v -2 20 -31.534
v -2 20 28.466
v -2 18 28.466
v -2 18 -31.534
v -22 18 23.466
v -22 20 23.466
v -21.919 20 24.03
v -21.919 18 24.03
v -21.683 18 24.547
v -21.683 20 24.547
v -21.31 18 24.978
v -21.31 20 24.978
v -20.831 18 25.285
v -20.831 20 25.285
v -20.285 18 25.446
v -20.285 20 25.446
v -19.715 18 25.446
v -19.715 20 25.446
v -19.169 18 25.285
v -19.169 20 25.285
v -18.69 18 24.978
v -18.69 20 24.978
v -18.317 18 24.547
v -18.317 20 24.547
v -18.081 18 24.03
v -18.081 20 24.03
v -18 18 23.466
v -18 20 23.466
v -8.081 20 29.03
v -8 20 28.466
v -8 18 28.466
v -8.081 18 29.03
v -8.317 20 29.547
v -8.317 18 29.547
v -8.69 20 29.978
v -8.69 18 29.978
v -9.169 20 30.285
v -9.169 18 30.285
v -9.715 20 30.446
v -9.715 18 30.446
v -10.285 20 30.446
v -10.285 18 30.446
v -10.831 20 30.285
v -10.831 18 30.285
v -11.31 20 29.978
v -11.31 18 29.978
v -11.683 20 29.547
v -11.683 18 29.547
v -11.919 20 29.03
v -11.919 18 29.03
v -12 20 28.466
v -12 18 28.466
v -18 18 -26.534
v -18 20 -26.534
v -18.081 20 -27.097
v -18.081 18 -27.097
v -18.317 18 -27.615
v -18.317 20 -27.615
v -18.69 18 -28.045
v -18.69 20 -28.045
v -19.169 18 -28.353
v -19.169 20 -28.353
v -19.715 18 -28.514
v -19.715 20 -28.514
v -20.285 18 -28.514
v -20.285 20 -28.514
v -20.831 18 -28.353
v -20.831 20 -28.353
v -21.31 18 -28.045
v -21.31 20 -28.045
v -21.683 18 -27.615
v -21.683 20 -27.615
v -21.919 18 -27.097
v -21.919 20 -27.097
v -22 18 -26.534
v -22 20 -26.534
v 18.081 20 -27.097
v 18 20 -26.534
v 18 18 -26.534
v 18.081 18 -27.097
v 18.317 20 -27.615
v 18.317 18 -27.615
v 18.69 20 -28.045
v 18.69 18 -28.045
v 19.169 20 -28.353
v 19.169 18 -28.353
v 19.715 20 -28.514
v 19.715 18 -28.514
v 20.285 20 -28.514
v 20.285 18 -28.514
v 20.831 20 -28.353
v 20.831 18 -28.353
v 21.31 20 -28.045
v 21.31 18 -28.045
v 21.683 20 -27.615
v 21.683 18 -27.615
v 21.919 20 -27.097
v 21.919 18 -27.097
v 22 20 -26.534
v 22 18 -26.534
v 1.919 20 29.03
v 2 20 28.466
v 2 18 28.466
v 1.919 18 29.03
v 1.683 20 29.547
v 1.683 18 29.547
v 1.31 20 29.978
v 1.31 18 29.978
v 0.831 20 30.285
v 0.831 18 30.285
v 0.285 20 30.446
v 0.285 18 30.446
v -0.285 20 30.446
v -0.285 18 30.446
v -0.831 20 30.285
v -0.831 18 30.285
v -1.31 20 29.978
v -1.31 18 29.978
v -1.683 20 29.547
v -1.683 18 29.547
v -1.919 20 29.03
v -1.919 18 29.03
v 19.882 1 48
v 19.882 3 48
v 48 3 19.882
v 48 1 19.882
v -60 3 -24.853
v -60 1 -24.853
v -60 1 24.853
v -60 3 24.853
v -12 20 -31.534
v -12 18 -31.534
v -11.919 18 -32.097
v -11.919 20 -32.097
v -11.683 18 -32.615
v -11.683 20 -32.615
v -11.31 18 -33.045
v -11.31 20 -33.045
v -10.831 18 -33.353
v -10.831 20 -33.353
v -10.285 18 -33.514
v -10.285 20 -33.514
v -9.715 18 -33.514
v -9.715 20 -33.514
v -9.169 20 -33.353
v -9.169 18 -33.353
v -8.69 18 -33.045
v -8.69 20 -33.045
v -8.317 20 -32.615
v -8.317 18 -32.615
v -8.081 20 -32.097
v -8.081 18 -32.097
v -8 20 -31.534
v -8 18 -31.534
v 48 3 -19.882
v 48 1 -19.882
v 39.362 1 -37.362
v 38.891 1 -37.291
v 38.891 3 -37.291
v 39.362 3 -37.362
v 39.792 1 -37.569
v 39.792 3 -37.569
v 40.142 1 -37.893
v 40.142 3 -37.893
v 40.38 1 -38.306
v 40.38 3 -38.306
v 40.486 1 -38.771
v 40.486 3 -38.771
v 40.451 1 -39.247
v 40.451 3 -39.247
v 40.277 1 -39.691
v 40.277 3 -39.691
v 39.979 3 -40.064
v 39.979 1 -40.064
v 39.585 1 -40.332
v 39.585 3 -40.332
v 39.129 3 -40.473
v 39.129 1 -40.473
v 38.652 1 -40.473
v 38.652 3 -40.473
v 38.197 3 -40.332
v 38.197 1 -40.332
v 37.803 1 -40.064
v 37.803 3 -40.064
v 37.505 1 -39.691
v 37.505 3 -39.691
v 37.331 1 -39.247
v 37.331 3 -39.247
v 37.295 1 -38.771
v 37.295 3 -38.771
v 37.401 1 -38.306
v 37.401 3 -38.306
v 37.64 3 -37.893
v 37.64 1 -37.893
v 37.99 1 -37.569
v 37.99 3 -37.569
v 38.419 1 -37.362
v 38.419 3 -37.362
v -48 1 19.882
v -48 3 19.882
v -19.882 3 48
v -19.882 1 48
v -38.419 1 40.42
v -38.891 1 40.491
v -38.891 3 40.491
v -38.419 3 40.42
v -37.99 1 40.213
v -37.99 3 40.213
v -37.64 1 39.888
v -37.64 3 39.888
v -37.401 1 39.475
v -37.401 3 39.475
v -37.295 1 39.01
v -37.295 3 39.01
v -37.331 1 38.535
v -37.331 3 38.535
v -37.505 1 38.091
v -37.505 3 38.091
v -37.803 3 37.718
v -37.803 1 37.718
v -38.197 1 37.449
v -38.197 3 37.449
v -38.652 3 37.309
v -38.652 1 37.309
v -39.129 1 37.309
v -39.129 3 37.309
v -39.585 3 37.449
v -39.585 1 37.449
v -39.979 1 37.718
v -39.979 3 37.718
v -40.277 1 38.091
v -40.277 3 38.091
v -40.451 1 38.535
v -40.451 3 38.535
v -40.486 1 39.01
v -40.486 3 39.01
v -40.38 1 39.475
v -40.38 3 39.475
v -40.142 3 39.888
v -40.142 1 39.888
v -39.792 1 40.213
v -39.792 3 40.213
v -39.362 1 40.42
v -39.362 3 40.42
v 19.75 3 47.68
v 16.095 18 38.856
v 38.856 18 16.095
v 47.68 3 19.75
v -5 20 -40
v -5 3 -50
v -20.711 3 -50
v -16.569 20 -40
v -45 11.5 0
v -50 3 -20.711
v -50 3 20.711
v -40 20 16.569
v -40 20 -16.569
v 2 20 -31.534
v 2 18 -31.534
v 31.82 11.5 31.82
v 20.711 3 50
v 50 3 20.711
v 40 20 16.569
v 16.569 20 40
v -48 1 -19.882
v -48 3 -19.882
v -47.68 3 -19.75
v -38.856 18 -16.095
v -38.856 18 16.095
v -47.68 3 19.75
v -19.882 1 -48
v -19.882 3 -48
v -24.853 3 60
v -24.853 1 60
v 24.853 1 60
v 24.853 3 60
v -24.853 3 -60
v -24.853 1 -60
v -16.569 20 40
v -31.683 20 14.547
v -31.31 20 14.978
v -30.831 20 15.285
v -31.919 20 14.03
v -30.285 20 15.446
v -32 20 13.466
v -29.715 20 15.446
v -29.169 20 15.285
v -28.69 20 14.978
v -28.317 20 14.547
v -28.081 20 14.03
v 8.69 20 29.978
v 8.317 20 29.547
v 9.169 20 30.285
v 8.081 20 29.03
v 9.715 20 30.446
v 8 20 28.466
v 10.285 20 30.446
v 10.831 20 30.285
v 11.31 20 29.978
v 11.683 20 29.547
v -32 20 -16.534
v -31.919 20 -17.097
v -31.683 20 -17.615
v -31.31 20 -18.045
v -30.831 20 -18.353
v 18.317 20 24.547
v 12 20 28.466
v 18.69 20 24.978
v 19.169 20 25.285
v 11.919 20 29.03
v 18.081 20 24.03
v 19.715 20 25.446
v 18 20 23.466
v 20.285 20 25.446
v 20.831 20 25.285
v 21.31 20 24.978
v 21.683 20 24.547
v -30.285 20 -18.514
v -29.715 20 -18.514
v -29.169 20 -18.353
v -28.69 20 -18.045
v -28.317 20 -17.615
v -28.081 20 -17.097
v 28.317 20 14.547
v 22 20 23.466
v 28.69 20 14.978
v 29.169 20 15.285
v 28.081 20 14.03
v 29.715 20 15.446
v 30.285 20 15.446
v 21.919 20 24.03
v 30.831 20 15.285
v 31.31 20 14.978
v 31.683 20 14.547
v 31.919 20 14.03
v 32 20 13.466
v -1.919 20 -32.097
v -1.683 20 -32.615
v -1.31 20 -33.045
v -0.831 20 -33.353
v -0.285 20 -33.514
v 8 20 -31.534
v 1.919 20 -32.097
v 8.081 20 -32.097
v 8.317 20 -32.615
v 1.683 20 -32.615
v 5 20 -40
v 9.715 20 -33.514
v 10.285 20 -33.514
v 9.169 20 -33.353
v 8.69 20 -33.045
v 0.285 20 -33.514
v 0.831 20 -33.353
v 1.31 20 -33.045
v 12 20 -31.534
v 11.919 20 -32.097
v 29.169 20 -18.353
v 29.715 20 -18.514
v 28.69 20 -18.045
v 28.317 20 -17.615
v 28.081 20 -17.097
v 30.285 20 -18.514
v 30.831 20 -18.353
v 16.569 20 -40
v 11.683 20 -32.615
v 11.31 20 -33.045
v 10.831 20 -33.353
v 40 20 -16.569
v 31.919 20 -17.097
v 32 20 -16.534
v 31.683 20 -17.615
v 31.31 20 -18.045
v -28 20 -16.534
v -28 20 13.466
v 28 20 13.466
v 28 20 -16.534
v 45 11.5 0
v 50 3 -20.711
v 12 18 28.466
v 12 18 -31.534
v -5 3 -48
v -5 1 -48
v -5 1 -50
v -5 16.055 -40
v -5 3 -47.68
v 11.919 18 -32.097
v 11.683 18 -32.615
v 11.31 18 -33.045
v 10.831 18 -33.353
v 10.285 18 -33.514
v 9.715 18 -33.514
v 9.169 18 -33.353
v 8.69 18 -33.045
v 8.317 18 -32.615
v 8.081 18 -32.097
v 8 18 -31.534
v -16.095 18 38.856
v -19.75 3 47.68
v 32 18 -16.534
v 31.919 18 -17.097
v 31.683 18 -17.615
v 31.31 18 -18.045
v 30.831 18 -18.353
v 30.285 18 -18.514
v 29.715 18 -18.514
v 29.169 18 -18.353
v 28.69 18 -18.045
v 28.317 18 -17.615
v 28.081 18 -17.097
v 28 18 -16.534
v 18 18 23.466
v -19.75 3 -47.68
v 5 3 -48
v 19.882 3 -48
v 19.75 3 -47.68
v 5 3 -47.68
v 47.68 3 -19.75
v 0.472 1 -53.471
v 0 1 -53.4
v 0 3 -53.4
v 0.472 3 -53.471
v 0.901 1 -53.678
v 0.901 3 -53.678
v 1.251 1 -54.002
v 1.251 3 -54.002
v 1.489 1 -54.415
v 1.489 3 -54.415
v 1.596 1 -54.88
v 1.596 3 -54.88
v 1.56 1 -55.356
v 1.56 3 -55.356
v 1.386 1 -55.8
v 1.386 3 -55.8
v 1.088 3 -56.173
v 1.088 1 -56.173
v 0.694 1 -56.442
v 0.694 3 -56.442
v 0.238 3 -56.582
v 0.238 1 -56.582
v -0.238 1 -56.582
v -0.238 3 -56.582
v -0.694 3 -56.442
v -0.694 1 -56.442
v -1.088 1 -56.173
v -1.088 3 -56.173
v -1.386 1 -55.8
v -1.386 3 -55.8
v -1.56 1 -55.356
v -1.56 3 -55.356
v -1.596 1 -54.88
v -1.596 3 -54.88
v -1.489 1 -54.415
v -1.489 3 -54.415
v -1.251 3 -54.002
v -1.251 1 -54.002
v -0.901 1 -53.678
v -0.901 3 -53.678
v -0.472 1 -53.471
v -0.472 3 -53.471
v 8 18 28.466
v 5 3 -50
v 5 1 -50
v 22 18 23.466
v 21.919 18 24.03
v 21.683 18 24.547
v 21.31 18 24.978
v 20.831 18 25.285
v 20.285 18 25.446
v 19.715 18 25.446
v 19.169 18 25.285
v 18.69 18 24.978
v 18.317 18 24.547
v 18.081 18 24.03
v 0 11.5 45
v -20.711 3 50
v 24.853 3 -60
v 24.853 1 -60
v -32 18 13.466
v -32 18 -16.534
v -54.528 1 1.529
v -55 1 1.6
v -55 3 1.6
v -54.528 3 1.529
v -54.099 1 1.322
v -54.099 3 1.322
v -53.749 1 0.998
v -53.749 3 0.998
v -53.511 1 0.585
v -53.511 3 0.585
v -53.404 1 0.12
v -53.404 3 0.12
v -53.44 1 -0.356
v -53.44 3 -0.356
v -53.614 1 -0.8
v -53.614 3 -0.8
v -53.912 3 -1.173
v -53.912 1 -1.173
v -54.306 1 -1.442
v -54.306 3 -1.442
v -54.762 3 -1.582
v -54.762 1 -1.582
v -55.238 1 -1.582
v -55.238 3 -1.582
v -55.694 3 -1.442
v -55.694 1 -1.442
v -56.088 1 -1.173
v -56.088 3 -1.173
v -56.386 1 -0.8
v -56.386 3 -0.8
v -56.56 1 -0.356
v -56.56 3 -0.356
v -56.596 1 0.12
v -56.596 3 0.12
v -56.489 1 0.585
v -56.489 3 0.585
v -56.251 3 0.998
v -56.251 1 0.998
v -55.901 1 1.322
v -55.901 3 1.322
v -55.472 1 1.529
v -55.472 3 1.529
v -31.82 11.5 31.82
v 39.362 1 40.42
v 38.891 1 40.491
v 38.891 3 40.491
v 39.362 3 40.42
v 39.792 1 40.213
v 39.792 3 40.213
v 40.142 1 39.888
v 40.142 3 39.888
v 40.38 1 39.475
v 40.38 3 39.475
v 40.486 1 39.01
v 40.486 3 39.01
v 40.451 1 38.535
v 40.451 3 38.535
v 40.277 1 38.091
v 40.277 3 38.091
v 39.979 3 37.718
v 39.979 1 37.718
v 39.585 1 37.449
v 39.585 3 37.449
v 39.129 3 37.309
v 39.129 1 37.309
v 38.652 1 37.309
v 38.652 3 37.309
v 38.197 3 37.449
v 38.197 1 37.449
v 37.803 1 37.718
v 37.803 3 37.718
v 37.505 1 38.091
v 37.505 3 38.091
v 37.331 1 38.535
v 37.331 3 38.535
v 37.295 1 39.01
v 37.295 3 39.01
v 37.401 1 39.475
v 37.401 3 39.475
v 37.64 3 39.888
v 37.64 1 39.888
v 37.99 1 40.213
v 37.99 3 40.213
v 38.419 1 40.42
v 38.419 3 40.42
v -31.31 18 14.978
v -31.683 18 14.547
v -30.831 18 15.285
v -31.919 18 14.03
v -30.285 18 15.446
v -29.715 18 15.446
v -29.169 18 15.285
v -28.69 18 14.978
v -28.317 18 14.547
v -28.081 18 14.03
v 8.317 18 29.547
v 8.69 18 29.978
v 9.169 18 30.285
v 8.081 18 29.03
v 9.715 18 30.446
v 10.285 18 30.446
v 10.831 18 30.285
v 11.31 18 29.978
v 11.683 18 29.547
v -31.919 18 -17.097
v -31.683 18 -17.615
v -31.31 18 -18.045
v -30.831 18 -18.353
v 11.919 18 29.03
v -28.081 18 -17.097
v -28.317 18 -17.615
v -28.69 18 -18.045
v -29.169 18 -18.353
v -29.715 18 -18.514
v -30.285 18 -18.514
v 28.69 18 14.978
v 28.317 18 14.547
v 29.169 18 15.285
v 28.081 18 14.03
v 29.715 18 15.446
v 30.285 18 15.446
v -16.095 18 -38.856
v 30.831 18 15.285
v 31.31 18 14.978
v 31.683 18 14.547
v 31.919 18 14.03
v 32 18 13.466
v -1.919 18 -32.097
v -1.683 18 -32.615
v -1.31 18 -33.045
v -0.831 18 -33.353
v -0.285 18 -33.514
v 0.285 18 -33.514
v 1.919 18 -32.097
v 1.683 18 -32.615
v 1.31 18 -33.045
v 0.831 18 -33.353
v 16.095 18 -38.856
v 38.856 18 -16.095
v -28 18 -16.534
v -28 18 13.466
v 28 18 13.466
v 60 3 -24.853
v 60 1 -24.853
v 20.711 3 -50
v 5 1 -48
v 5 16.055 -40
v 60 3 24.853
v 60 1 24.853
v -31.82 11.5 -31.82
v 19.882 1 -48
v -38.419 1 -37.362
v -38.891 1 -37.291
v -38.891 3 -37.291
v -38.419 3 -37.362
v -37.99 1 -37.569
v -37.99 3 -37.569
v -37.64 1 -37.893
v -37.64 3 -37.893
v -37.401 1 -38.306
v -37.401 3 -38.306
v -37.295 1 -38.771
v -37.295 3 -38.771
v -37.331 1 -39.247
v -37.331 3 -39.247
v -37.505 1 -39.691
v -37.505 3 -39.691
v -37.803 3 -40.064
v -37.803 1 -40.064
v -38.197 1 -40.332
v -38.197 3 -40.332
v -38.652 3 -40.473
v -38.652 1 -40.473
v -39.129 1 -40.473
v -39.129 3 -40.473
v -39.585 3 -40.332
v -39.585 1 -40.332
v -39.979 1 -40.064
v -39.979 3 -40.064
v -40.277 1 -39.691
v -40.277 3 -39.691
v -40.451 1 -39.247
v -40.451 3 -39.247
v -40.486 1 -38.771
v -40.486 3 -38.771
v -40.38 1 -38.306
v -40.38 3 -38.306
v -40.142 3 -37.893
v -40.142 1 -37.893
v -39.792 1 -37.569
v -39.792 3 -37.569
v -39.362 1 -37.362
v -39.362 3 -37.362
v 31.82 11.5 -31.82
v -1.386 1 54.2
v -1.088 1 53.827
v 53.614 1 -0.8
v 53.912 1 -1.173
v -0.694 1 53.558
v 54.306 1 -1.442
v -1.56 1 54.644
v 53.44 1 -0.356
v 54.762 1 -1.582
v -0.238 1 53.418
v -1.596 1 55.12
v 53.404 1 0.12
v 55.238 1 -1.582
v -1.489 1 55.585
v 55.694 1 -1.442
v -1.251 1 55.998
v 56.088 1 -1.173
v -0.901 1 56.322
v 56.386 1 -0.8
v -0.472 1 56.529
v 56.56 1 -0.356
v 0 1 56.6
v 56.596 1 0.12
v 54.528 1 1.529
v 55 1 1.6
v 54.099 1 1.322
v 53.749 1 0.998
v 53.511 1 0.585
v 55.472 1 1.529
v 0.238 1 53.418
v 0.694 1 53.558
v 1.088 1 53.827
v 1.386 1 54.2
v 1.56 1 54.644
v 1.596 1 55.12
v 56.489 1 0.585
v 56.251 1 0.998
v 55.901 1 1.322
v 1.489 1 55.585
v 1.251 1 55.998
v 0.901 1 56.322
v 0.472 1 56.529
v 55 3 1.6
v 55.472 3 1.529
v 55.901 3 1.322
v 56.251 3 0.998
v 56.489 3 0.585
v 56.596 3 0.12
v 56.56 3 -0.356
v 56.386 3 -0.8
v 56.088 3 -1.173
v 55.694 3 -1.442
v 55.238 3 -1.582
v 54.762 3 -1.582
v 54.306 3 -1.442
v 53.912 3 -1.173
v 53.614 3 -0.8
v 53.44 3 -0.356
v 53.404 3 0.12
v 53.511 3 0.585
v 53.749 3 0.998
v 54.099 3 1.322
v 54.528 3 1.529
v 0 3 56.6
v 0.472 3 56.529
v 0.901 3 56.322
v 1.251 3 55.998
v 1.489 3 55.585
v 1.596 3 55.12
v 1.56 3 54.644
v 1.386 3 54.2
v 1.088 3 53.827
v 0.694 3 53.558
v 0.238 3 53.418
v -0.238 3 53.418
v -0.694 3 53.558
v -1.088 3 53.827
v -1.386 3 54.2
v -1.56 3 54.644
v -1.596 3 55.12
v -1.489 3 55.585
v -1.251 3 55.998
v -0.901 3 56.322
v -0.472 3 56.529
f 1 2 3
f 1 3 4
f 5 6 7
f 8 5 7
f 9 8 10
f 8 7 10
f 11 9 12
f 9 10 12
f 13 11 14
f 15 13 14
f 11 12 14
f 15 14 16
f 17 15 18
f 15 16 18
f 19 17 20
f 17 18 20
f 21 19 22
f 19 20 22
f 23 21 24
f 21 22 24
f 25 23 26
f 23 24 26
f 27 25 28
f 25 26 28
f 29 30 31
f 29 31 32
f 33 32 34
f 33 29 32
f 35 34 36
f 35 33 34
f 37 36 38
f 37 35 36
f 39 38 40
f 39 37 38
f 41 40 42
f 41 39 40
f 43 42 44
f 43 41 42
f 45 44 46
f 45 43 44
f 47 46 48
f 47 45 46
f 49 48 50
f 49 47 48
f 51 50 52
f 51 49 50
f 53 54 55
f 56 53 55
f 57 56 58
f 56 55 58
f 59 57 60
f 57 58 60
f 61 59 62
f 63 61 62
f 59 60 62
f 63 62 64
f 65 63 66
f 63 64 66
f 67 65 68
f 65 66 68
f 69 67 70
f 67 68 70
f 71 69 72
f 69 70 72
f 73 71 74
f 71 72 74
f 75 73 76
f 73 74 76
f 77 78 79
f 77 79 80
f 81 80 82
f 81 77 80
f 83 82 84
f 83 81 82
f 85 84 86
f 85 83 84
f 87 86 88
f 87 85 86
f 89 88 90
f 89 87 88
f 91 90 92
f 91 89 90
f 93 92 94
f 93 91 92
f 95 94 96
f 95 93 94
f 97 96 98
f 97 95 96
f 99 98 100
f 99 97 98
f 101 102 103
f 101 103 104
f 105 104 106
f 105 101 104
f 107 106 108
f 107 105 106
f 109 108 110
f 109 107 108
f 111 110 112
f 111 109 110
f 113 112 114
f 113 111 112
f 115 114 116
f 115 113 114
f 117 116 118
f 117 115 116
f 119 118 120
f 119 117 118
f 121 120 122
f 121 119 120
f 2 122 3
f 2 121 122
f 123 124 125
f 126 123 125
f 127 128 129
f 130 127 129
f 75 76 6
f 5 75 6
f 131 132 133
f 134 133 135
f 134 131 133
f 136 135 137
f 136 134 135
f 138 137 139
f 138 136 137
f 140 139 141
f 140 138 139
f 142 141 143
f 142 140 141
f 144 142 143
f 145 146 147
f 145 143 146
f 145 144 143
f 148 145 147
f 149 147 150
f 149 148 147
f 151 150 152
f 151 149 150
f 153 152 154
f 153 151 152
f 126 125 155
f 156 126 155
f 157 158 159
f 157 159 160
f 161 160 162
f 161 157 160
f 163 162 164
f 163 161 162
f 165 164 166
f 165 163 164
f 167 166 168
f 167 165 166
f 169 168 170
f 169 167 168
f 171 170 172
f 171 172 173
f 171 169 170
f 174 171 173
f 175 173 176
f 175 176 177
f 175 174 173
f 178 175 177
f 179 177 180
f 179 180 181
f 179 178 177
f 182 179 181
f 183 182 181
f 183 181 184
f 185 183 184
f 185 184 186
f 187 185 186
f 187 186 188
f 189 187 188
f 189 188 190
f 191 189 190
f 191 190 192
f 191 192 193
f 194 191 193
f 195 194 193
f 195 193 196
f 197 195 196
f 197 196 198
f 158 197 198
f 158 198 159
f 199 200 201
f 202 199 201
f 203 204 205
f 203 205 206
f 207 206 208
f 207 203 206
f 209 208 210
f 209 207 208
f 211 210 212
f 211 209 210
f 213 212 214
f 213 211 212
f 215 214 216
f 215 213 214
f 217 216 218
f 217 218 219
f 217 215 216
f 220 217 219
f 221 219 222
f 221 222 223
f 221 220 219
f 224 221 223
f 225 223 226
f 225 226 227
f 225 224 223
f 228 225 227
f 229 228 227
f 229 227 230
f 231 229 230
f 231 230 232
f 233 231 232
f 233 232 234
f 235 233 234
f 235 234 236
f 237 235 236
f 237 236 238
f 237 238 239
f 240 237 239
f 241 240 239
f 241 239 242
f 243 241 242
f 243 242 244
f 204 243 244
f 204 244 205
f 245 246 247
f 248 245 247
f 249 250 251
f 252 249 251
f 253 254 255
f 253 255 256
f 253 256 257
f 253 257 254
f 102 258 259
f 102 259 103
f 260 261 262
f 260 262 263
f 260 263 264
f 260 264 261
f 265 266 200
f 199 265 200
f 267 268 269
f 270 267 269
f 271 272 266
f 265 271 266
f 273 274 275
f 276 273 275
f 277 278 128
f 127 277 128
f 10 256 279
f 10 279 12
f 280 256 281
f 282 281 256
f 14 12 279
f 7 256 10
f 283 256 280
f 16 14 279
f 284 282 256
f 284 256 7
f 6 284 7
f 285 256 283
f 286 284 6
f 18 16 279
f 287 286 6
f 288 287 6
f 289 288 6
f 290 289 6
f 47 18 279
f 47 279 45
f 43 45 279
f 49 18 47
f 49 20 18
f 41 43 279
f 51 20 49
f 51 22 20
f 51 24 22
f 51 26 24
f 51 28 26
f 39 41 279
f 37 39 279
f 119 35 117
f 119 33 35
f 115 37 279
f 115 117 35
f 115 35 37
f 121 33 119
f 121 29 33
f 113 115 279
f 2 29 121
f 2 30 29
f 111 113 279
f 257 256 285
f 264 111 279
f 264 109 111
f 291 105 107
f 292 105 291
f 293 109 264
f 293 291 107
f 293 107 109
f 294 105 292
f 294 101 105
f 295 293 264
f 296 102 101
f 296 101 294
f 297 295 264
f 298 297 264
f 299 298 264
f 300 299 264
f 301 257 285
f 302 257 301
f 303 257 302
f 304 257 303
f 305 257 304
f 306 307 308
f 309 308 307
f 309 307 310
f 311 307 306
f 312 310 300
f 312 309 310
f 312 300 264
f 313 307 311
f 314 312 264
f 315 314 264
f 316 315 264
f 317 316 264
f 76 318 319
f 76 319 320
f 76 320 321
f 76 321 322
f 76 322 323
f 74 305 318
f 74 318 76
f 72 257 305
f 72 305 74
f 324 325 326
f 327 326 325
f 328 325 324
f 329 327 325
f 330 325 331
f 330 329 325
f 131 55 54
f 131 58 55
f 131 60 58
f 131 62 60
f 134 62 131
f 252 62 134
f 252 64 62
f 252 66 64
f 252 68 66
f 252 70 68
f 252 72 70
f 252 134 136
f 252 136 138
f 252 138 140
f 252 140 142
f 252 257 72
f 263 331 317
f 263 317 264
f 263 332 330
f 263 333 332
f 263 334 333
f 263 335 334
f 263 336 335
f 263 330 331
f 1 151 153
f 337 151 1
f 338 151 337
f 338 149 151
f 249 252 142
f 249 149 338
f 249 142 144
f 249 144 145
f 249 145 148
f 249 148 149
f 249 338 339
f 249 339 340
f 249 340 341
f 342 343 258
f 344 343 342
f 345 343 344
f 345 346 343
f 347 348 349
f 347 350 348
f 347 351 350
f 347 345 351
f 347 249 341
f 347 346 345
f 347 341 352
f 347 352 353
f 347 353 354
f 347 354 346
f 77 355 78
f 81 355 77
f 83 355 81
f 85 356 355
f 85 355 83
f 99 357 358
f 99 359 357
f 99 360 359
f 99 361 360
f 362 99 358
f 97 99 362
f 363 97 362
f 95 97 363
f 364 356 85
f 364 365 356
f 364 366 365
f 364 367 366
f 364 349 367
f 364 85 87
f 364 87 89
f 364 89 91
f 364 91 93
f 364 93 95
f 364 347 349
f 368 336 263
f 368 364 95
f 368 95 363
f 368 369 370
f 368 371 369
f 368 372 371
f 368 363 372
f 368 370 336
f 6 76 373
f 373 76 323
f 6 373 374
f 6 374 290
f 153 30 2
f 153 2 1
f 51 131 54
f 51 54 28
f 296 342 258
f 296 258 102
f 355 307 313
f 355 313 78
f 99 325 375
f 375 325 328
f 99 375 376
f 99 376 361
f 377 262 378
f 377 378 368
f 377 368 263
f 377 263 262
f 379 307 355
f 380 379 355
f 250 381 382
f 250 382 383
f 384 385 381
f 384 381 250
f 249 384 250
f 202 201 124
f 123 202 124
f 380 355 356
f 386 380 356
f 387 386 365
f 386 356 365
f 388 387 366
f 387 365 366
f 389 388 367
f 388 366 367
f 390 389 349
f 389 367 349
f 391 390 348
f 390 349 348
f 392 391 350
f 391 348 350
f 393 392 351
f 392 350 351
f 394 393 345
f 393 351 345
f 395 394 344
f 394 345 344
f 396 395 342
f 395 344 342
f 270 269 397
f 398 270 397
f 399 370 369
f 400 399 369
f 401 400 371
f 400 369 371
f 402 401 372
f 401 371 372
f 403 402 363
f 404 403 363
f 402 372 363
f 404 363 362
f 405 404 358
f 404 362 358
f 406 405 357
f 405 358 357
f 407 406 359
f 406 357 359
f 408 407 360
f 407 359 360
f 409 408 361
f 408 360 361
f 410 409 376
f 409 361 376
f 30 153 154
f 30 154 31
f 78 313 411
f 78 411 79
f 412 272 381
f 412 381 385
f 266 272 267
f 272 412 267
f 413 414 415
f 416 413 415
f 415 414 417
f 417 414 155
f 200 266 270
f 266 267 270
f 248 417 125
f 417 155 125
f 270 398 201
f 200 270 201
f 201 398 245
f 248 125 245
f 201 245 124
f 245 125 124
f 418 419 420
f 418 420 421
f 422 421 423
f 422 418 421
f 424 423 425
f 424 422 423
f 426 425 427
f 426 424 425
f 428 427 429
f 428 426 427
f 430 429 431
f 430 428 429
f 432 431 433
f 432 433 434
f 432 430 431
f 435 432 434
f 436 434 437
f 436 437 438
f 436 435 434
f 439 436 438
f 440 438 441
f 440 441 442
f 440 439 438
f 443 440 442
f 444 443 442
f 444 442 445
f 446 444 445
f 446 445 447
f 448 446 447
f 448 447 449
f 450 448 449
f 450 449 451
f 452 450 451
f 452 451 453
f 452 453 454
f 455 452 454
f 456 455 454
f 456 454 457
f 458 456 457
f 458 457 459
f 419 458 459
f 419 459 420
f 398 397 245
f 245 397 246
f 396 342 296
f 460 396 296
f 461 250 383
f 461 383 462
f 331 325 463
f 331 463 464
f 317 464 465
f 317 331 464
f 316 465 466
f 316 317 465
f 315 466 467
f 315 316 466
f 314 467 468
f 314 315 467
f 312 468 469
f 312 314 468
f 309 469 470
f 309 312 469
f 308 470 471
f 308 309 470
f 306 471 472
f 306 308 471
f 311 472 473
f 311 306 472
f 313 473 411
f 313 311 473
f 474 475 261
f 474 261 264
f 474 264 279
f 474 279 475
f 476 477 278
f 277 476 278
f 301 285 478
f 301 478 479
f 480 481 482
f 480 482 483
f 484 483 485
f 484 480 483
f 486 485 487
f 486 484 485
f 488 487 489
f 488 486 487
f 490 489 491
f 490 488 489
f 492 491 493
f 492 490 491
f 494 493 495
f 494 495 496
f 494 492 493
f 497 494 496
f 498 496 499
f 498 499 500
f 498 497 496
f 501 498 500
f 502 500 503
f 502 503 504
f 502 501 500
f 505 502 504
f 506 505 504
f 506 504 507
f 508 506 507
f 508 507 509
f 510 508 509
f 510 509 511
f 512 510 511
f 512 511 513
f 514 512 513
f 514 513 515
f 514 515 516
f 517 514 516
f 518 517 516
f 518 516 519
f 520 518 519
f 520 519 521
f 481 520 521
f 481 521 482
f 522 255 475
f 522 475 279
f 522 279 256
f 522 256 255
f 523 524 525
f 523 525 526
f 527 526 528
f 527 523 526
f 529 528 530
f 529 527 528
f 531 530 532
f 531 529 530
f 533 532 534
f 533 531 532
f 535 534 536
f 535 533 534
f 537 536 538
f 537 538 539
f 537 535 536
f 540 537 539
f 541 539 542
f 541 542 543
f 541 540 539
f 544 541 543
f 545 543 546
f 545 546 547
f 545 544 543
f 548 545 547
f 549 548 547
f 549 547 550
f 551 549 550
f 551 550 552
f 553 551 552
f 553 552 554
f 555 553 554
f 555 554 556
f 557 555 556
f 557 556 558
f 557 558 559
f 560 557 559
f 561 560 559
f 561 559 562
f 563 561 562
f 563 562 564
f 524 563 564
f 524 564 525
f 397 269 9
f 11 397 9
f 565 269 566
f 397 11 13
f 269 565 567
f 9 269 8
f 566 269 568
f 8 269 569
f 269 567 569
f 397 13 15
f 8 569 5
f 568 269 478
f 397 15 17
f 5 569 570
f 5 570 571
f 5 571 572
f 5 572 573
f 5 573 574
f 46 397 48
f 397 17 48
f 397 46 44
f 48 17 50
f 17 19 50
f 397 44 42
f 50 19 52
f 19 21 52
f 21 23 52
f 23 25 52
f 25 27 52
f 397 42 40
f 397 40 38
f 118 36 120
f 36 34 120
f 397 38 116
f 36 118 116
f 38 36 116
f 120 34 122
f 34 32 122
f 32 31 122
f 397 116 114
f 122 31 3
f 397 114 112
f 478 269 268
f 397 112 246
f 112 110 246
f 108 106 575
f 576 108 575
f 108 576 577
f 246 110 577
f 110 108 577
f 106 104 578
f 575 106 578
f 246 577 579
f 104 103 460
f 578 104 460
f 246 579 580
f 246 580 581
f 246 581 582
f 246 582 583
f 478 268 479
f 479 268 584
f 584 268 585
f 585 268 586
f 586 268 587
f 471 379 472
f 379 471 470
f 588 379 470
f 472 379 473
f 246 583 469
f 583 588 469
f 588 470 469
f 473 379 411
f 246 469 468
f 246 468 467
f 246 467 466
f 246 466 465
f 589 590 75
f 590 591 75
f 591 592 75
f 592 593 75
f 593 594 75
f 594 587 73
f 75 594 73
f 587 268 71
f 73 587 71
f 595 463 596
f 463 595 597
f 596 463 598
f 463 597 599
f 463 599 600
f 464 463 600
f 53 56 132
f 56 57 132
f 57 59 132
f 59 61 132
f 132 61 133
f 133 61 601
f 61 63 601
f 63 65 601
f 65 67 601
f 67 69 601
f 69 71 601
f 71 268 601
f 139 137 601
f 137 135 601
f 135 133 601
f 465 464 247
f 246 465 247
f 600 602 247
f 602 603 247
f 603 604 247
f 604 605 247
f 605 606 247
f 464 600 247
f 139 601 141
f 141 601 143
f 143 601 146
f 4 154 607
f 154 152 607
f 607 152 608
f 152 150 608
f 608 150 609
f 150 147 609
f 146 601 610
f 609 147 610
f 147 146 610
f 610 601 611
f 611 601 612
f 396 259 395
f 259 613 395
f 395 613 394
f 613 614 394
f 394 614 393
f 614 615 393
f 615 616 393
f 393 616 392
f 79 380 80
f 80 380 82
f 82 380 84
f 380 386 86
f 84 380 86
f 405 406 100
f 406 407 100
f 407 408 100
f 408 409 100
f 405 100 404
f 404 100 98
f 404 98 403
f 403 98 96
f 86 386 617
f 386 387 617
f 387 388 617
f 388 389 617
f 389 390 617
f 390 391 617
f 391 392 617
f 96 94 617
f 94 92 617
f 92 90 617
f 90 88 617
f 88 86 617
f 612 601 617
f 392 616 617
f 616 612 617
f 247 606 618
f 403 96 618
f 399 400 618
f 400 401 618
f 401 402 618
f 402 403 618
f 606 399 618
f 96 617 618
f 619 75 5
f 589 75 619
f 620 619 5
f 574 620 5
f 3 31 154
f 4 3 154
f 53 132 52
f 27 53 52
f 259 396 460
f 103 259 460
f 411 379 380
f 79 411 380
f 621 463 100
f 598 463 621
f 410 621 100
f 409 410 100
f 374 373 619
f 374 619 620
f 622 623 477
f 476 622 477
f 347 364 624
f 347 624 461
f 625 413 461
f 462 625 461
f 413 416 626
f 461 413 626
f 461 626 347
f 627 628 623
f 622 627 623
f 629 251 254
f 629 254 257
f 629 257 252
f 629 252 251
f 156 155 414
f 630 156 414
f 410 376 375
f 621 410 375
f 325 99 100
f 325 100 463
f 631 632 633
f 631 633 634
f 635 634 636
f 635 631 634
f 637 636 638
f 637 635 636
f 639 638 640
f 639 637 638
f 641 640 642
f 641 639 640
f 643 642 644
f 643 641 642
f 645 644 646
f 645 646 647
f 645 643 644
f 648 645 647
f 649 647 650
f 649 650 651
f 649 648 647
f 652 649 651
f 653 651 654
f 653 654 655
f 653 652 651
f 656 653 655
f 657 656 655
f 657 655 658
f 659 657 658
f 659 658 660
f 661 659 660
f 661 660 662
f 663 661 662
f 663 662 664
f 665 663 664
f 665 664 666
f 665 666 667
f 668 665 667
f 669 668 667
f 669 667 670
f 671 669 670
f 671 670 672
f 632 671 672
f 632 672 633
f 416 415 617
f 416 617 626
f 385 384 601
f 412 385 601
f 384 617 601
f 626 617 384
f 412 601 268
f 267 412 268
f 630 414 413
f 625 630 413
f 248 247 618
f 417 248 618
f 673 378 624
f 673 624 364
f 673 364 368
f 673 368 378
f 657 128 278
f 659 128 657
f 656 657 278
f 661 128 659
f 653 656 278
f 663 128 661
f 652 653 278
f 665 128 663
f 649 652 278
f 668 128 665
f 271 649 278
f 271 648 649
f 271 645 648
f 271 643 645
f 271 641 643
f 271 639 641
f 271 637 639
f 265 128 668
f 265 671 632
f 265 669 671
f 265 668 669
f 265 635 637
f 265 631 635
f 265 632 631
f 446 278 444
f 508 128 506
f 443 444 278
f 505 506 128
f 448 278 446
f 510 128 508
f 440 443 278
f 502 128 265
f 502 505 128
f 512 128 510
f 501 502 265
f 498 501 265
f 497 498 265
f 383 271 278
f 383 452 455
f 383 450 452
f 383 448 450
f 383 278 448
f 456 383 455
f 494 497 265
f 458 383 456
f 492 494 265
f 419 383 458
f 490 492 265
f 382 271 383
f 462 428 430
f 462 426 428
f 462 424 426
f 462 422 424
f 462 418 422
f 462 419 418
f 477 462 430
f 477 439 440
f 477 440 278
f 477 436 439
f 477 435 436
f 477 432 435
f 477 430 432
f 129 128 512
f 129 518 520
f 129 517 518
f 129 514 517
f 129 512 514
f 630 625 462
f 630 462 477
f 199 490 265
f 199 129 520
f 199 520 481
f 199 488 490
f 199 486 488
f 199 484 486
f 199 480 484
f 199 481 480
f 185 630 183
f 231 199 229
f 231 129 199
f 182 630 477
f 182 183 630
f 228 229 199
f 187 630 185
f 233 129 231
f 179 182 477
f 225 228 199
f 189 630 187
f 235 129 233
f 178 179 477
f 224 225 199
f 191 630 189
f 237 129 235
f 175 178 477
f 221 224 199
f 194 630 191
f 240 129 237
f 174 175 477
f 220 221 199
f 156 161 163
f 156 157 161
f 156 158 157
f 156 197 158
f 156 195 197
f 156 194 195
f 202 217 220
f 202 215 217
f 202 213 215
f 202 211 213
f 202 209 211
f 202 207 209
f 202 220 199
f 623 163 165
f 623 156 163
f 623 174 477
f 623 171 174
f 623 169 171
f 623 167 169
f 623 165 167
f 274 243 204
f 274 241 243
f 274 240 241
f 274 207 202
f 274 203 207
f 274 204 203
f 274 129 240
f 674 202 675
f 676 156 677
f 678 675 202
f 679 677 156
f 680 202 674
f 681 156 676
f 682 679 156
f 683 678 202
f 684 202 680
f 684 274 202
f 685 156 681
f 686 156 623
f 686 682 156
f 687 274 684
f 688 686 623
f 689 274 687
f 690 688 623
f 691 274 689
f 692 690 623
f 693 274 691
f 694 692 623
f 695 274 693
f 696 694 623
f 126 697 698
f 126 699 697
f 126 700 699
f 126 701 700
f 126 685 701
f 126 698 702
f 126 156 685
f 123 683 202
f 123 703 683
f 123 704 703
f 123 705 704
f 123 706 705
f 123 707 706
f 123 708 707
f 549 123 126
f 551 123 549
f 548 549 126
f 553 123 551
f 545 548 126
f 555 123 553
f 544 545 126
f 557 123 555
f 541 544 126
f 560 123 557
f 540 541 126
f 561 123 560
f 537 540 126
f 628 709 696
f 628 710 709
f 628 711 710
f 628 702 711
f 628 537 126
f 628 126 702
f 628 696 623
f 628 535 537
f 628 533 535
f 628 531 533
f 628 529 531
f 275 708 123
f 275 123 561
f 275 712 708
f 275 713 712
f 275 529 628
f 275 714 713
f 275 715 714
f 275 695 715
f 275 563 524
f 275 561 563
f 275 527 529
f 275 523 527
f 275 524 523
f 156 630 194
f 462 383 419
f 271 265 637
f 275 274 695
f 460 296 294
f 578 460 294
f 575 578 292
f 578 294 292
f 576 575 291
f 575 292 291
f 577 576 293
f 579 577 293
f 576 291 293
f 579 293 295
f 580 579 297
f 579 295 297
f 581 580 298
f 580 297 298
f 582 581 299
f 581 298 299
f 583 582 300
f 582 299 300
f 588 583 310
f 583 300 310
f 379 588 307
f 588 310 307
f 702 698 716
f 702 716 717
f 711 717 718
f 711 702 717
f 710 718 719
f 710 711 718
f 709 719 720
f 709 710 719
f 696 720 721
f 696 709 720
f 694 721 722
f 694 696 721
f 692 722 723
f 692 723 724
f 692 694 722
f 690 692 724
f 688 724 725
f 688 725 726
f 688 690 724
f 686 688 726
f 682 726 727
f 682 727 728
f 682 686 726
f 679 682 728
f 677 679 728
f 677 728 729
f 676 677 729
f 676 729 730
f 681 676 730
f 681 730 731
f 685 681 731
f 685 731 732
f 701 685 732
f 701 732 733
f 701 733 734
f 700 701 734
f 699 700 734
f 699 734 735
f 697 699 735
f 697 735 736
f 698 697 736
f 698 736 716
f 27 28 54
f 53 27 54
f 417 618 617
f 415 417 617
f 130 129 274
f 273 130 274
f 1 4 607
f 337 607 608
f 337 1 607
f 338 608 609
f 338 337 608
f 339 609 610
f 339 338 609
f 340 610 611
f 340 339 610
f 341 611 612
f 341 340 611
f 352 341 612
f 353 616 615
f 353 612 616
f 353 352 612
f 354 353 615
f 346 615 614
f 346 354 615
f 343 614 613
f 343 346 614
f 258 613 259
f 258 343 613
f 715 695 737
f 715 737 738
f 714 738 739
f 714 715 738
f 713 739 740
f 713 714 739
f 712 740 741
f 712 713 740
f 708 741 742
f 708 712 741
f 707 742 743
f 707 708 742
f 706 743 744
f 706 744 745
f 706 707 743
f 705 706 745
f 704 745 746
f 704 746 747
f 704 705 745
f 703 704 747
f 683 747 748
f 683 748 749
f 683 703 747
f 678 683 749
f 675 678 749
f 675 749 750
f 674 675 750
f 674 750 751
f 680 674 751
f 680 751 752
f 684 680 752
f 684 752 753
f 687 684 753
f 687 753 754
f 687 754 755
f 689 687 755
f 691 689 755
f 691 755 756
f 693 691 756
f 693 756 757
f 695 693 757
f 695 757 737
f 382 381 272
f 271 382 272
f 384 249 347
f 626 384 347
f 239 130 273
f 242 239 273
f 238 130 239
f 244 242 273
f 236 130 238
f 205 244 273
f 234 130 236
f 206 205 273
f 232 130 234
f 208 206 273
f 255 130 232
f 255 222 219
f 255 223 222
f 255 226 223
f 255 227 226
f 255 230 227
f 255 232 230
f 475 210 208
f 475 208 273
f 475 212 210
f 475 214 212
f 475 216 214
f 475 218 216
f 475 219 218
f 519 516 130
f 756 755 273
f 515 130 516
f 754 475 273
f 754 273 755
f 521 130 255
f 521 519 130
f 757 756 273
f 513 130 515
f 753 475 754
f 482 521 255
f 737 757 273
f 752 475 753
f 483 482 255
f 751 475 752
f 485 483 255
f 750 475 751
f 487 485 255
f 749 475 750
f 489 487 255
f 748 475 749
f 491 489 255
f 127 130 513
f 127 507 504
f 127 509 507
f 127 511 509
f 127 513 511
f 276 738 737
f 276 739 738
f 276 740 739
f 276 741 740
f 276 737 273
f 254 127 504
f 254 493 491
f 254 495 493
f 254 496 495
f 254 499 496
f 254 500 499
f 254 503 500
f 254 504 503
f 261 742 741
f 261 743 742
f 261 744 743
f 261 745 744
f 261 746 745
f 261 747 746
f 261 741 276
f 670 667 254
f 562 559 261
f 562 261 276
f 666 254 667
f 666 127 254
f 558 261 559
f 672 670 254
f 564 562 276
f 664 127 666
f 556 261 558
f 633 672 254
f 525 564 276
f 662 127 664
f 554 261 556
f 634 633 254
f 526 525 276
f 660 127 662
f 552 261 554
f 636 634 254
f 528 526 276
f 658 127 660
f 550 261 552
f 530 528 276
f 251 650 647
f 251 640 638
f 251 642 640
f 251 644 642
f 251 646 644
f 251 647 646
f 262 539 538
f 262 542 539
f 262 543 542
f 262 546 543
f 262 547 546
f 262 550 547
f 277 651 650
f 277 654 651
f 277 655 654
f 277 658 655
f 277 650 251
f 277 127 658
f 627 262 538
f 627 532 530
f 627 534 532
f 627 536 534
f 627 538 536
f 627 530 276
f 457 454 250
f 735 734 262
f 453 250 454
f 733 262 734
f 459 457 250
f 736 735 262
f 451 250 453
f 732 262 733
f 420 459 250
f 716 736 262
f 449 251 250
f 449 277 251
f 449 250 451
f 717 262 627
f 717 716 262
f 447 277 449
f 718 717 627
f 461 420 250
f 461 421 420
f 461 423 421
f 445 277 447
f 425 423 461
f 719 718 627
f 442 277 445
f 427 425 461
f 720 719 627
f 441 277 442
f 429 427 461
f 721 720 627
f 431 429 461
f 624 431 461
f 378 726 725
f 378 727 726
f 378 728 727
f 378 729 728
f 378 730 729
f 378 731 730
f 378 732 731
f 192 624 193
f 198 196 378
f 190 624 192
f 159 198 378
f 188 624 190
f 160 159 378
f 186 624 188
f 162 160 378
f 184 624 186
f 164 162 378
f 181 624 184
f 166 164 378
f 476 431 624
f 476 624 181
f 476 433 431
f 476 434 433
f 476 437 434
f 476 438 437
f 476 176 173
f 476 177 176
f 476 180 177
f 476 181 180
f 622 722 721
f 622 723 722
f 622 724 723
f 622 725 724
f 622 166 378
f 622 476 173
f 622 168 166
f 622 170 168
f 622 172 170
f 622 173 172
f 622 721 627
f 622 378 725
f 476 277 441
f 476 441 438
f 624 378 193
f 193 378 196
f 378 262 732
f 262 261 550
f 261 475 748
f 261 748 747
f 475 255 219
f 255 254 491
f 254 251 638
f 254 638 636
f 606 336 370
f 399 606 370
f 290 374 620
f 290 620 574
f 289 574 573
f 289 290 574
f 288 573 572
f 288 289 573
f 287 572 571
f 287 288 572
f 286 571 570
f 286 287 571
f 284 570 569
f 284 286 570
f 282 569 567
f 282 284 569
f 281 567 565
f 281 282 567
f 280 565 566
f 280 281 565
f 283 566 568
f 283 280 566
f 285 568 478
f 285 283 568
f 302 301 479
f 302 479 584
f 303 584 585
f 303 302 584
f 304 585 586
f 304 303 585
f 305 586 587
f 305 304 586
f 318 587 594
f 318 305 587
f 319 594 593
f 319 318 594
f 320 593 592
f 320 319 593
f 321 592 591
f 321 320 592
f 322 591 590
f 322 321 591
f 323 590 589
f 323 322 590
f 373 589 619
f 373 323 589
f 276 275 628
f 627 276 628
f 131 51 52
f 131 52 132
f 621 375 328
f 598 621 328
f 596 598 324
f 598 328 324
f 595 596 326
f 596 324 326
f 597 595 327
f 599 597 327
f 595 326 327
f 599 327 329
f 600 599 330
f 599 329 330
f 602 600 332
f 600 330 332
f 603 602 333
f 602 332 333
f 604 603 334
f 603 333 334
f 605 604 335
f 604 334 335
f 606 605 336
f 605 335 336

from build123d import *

# Parameters (mm, degrees)
SKETCH1_R           = 1.6
BOSS_EXTRUDE1_DEPTH = 3
CUT_EXTRUDE1_DEPTH  = 85.905830189
BOSS_EXTRUDE2_DEPTH = 2
BOSS_EXTRUDE3_DEPTH = 3
SHELL1_DEPTH        = 15
SHELL1_DRAFT        = 30.4655449
SKETCH6_W           = 10
SKETCH6_H           = 10
CUT_EXTRUDE2_DEPTH  = 88.177978871
CUT_EXTRUDE3_DEPTH  = 88.177978894
SKETCH8_W           = 151.222151061
SKETCH8_H           = 131.165318394
CUT_EXTRUDE4_DEPTH  = 1


# Read off the part's stored shape, not the designer's step: Shell1
with BuildPart() as part:
    # Sketch1 → Boss-Extrude1 (new body)
    with BuildSketch(Plane(origin=(0, 0, 0), x_dir=(1, 0, 0), z_dir=(0, 1, 0))):
        Polygon((24.852813742, 60), (-24.852813742, 60), (-60, 24.852813742), (-60, -24.852813742), (-24.852813742, -60), (24.852813742, -60), (60, -24.852813742), (60, 24.852813742), align=None)
        with Locations(Location((-38.890872965, -38.890872965, 0), (0, 0, 270))):
            Circle(SKETCH1_R, mode=Mode.SUBTRACT)
        with Locations(Location((0, -55, 0), (0, 0, 270))):
            Circle(SKETCH1_R, mode=Mode.SUBTRACT)
        with Locations(Location((38.890872965, -38.890872965, 0), (0, 0, 270))):
            Circle(SKETCH1_R, mode=Mode.SUBTRACT)
        with Locations(Location((38.890872965, 38.890872965, 0), (0, 0, 270))):
            Circle(SKETCH1_R, mode=Mode.SUBTRACT)
        with Locations(Location((0, 55, 0), (0, 0, 270))):
            Circle(SKETCH1_R, mode=Mode.SUBTRACT)
        with Locations(Location((-38.890872965, 38.890872965, 0), (0, 0, 270))):
            Circle(SKETCH1_R, mode=Mode.SUBTRACT)
        with Locations(Location((55, 0, 0), (0, 0, 270))):
            Circle(SKETCH1_R, mode=Mode.SUBTRACT)
        with Locations(Location((-55, 0, 0), (0, 0, 270))):
            Circle(SKETCH1_R, mode=Mode.SUBTRACT)
    extrude(amount=BOSS_EXTRUDE1_DEPTH)

    # Sketch2 → Cut-Extrude1 (cut, through all)
    with BuildSketch(Plane(origin=(0, 3, 0), x_dir=(1, 0, 0), z_dir=(0, 1, 0))):
        Polygon((20.710678119, 50), (-20.710678119, 50), (-50, 20.710678119), (-50, -20.710678119), (-20.710678119, -50), (20.710678119, -50), (50, -20.710678119), (50, 20.710678119), align=None)
    extrude(amount=-CUT_EXTRUDE1_DEPTH, mode=Mode.SUBTRACT)



with BuildPart() as body_2:
    # Sketch3 → Boss-Extrude2 (new body)
    with BuildSketch(Plane(origin=(0, 18, 0), x_dir=(1, 0, 0), z_dir=(0, 1, 0))):
        Polygon((16.568542495, 40), (-16.568542495, 40), (-40, 16.568542495), (-40, -16.568542495), (-16.568542495, -40), (16.568542495, -40), (40, -16.568542495), (40, 16.568542495), align=None)
    extrude(amount=BOSS_EXTRUDE2_DEPTH)

    # Sketch2<2> → section 0 of loft1
    with BuildSketch(Plane(origin=(0, 3, 0), x_dir=(1, 0, 0), z_dir=(0, 1, 0)), mode=Mode.PRIVATE) as loft1_s0:
        with BuildLine():
            Line((20.710678119, 50), (-20.710678119, 50))
            Line((-20.710678119, 50), (-50, 20.710678119))
            Line((-50, 20.710678119), (-50, -20.710678119))
            Line((-50, -20.710678119), (-20.710678119, -50))
            Line((-20.710678119, -50), (20.710678119, -50))
            Line((20.710678119, -50), (50, -20.710678119))
            Line((50, -20.710678119), (50, 20.710678119))
            Line((50, 20.710678119), (20.710678119, 50))
        make_face()
    # loft up to a face of the part (loft1)
    loft([loft1_s0.sketch, body_2.faces().sort_by_distance((0, 20, 0))[0]])


with BuildPart() as part_1:
    add(part.part)

    add(body_2.part)  # Boss-Extrude3 merges body 2
    # Sketch5 → Boss-Extrude3 (add)
    with BuildSketch(Plane.XZ.offset(-3)):
        Polygon((-50, -20.710678119), (-20.710678119, -50), (20.710678119, -50), (50, -20.710678119), (50, 20.710678119), (20.710678119, 50), (-20.710678119, 50), (-50, 20.710678119), align=None)
        Polygon((48, -19.882250994), (19.882250994, -48), (-19.882250994, -48), (-48, -19.882250994), (-48, 19.882250994), (-19.882250994, 48), (19.882250994, 48), (48, 19.882250994), align=None, mode=Mode.SUBTRACT)
    extrude(amount=BOSS_EXTRUDE3_DEPTH)


with BuildPart() as shell1_tool:
    # Shell1 outline → Shell1 (with draft: the straight prism first)
    with BuildSketch(Plane(origin=(0, 18, 0), x_dir=(1, 0, 0), z_dir=(0, 1, 0))):
        Polygon((16.09472687, 38.856107891), (-16.09472687, 38.856107891), (-38.856107891, 16.09472687), (-38.856107891, -16.09472687), (-16.09472687, -38.856107891), (16.09472687, -38.856107891), (38.856107891, -16.09472687), (38.856107891, 16.09472687), align=None)
    extrude(amount=-SHELL1_DEPTH)
    # Shell1: the draft: its side faces are tilted about the plane it starts from
    shell1_sides = [shell1_tool.faces().sort_by_distance(p)[0] for p in [
        (0, 10.5, -38.856107891),
        (-27.475417381, 10.5, -27.47541738),
        (-38.856107891, 10.5, 0),
        (-27.47541738, 10.5, 27.475417381),
        (0, 10.5, 38.856107891),
        (27.475417381, 10.5, 27.47541738),
        (38.856107891, 10.5, 0),
        (27.47541738, 10.5, -27.475417381),
    ]]
    draft(shell1_sides, Plane(origin=(0, 18, 0), x_dir=(1, 0, 0), z_dir=(0, 1, 0)), SHELL1_DRAFT)


with BuildPart() as part_2:
    add(part_1.part)

    # Shell1: cut by shell1_tool
    add(shell1_tool.part, mode=Mode.SUBTRACT)

    # Sketch6 → Cut-Extrude2 (cut, through all)
    with BuildSketch(Plane(origin=(0, 20, 0), x_dir=(1, 0, 0), z_dir=(0, 1, 0))):
        with Locations((0, 45)):
            Rectangle(SKETCH6_W, SKETCH6_H)
    extrude(amount=-CUT_EXTRUDE2_DEPTH, mode=Mode.SUBTRACT)

    # Sketch7 → Cut-Extrude3 (cut, through all)
    with BuildSketch(Plane(origin=(0, 20, 0), x_dir=(1, 0, 0), z_dir=(0, 1, 0))):
        with BuildLine():
            Line((-22, 26.533930893), (-22, -23.466069107))
            ThreePointArc((-22, -23.466069107), (-20, -25.466069107), (-18, -23.466069107))
            Line((-18, -23.466069107), (-18, 26.533930893))
            ThreePointArc((-18, 26.533930893), (-20, 28.533930893), (-22, 26.533930893))
        make_face()
        with BuildLine():
            Line((-28, 16.533930893), (-28, -13.466069107))
            ThreePointArc((-28, -13.466069107), (-30, -15.466069107), (-32, -13.466069107))
            Line((-32, -13.466069107), (-32, 16.533930893))
            ThreePointArc((-32, 16.533930893), (-30, 18.533930893), (-28, 16.533930893))
        make_face()
        with BuildLine():
            Line((-8, 31.533930893), (-8, -28.466069107))
            ThreePointArc((-8, -28.466069107), (-10, -30.466069107), (-12, -28.466069107))
            Line((-12, -28.466069107), (-12, 31.533930893))
            ThreePointArc((-12, 31.533930893), (-10, 33.533930893), (-8, 31.533930893))
        make_face()
        with BuildLine():
            Line((2, 31.533930893), (2, -28.466069107))
            ThreePointArc((2, -28.466069107), (0, -30.466069107), (-2, -28.466069107))
            Line((-2, -28.466069107), (-2, 31.533930893))
            ThreePointArc((-2, 31.533930893), (0, 33.533930893), (2, 31.533930893))
        make_face()
    cut_extrude3 = extrude(amount=-CUT_EXTRUDE3_DEPTH, mode=Mode.SUBTRACT)

    # Mirror1: Cut-Extrude3 across plane
    add(cut_extrude3.mirror(Plane.ZY), mode=Mode.SUBTRACT)

    # Sketch8 → Cut-Extrude4 (cut)
    with BuildSketch(Plane.XZ):
        with Locations((-0.059380878, -1.432630905)):
            Rectangle(SKETCH8_W, SKETCH8_H)
    extrude(amount=-CUT_EXTRUDE4_DEPTH, mode=Mode.SUBTRACT)


solid = part_2.part
